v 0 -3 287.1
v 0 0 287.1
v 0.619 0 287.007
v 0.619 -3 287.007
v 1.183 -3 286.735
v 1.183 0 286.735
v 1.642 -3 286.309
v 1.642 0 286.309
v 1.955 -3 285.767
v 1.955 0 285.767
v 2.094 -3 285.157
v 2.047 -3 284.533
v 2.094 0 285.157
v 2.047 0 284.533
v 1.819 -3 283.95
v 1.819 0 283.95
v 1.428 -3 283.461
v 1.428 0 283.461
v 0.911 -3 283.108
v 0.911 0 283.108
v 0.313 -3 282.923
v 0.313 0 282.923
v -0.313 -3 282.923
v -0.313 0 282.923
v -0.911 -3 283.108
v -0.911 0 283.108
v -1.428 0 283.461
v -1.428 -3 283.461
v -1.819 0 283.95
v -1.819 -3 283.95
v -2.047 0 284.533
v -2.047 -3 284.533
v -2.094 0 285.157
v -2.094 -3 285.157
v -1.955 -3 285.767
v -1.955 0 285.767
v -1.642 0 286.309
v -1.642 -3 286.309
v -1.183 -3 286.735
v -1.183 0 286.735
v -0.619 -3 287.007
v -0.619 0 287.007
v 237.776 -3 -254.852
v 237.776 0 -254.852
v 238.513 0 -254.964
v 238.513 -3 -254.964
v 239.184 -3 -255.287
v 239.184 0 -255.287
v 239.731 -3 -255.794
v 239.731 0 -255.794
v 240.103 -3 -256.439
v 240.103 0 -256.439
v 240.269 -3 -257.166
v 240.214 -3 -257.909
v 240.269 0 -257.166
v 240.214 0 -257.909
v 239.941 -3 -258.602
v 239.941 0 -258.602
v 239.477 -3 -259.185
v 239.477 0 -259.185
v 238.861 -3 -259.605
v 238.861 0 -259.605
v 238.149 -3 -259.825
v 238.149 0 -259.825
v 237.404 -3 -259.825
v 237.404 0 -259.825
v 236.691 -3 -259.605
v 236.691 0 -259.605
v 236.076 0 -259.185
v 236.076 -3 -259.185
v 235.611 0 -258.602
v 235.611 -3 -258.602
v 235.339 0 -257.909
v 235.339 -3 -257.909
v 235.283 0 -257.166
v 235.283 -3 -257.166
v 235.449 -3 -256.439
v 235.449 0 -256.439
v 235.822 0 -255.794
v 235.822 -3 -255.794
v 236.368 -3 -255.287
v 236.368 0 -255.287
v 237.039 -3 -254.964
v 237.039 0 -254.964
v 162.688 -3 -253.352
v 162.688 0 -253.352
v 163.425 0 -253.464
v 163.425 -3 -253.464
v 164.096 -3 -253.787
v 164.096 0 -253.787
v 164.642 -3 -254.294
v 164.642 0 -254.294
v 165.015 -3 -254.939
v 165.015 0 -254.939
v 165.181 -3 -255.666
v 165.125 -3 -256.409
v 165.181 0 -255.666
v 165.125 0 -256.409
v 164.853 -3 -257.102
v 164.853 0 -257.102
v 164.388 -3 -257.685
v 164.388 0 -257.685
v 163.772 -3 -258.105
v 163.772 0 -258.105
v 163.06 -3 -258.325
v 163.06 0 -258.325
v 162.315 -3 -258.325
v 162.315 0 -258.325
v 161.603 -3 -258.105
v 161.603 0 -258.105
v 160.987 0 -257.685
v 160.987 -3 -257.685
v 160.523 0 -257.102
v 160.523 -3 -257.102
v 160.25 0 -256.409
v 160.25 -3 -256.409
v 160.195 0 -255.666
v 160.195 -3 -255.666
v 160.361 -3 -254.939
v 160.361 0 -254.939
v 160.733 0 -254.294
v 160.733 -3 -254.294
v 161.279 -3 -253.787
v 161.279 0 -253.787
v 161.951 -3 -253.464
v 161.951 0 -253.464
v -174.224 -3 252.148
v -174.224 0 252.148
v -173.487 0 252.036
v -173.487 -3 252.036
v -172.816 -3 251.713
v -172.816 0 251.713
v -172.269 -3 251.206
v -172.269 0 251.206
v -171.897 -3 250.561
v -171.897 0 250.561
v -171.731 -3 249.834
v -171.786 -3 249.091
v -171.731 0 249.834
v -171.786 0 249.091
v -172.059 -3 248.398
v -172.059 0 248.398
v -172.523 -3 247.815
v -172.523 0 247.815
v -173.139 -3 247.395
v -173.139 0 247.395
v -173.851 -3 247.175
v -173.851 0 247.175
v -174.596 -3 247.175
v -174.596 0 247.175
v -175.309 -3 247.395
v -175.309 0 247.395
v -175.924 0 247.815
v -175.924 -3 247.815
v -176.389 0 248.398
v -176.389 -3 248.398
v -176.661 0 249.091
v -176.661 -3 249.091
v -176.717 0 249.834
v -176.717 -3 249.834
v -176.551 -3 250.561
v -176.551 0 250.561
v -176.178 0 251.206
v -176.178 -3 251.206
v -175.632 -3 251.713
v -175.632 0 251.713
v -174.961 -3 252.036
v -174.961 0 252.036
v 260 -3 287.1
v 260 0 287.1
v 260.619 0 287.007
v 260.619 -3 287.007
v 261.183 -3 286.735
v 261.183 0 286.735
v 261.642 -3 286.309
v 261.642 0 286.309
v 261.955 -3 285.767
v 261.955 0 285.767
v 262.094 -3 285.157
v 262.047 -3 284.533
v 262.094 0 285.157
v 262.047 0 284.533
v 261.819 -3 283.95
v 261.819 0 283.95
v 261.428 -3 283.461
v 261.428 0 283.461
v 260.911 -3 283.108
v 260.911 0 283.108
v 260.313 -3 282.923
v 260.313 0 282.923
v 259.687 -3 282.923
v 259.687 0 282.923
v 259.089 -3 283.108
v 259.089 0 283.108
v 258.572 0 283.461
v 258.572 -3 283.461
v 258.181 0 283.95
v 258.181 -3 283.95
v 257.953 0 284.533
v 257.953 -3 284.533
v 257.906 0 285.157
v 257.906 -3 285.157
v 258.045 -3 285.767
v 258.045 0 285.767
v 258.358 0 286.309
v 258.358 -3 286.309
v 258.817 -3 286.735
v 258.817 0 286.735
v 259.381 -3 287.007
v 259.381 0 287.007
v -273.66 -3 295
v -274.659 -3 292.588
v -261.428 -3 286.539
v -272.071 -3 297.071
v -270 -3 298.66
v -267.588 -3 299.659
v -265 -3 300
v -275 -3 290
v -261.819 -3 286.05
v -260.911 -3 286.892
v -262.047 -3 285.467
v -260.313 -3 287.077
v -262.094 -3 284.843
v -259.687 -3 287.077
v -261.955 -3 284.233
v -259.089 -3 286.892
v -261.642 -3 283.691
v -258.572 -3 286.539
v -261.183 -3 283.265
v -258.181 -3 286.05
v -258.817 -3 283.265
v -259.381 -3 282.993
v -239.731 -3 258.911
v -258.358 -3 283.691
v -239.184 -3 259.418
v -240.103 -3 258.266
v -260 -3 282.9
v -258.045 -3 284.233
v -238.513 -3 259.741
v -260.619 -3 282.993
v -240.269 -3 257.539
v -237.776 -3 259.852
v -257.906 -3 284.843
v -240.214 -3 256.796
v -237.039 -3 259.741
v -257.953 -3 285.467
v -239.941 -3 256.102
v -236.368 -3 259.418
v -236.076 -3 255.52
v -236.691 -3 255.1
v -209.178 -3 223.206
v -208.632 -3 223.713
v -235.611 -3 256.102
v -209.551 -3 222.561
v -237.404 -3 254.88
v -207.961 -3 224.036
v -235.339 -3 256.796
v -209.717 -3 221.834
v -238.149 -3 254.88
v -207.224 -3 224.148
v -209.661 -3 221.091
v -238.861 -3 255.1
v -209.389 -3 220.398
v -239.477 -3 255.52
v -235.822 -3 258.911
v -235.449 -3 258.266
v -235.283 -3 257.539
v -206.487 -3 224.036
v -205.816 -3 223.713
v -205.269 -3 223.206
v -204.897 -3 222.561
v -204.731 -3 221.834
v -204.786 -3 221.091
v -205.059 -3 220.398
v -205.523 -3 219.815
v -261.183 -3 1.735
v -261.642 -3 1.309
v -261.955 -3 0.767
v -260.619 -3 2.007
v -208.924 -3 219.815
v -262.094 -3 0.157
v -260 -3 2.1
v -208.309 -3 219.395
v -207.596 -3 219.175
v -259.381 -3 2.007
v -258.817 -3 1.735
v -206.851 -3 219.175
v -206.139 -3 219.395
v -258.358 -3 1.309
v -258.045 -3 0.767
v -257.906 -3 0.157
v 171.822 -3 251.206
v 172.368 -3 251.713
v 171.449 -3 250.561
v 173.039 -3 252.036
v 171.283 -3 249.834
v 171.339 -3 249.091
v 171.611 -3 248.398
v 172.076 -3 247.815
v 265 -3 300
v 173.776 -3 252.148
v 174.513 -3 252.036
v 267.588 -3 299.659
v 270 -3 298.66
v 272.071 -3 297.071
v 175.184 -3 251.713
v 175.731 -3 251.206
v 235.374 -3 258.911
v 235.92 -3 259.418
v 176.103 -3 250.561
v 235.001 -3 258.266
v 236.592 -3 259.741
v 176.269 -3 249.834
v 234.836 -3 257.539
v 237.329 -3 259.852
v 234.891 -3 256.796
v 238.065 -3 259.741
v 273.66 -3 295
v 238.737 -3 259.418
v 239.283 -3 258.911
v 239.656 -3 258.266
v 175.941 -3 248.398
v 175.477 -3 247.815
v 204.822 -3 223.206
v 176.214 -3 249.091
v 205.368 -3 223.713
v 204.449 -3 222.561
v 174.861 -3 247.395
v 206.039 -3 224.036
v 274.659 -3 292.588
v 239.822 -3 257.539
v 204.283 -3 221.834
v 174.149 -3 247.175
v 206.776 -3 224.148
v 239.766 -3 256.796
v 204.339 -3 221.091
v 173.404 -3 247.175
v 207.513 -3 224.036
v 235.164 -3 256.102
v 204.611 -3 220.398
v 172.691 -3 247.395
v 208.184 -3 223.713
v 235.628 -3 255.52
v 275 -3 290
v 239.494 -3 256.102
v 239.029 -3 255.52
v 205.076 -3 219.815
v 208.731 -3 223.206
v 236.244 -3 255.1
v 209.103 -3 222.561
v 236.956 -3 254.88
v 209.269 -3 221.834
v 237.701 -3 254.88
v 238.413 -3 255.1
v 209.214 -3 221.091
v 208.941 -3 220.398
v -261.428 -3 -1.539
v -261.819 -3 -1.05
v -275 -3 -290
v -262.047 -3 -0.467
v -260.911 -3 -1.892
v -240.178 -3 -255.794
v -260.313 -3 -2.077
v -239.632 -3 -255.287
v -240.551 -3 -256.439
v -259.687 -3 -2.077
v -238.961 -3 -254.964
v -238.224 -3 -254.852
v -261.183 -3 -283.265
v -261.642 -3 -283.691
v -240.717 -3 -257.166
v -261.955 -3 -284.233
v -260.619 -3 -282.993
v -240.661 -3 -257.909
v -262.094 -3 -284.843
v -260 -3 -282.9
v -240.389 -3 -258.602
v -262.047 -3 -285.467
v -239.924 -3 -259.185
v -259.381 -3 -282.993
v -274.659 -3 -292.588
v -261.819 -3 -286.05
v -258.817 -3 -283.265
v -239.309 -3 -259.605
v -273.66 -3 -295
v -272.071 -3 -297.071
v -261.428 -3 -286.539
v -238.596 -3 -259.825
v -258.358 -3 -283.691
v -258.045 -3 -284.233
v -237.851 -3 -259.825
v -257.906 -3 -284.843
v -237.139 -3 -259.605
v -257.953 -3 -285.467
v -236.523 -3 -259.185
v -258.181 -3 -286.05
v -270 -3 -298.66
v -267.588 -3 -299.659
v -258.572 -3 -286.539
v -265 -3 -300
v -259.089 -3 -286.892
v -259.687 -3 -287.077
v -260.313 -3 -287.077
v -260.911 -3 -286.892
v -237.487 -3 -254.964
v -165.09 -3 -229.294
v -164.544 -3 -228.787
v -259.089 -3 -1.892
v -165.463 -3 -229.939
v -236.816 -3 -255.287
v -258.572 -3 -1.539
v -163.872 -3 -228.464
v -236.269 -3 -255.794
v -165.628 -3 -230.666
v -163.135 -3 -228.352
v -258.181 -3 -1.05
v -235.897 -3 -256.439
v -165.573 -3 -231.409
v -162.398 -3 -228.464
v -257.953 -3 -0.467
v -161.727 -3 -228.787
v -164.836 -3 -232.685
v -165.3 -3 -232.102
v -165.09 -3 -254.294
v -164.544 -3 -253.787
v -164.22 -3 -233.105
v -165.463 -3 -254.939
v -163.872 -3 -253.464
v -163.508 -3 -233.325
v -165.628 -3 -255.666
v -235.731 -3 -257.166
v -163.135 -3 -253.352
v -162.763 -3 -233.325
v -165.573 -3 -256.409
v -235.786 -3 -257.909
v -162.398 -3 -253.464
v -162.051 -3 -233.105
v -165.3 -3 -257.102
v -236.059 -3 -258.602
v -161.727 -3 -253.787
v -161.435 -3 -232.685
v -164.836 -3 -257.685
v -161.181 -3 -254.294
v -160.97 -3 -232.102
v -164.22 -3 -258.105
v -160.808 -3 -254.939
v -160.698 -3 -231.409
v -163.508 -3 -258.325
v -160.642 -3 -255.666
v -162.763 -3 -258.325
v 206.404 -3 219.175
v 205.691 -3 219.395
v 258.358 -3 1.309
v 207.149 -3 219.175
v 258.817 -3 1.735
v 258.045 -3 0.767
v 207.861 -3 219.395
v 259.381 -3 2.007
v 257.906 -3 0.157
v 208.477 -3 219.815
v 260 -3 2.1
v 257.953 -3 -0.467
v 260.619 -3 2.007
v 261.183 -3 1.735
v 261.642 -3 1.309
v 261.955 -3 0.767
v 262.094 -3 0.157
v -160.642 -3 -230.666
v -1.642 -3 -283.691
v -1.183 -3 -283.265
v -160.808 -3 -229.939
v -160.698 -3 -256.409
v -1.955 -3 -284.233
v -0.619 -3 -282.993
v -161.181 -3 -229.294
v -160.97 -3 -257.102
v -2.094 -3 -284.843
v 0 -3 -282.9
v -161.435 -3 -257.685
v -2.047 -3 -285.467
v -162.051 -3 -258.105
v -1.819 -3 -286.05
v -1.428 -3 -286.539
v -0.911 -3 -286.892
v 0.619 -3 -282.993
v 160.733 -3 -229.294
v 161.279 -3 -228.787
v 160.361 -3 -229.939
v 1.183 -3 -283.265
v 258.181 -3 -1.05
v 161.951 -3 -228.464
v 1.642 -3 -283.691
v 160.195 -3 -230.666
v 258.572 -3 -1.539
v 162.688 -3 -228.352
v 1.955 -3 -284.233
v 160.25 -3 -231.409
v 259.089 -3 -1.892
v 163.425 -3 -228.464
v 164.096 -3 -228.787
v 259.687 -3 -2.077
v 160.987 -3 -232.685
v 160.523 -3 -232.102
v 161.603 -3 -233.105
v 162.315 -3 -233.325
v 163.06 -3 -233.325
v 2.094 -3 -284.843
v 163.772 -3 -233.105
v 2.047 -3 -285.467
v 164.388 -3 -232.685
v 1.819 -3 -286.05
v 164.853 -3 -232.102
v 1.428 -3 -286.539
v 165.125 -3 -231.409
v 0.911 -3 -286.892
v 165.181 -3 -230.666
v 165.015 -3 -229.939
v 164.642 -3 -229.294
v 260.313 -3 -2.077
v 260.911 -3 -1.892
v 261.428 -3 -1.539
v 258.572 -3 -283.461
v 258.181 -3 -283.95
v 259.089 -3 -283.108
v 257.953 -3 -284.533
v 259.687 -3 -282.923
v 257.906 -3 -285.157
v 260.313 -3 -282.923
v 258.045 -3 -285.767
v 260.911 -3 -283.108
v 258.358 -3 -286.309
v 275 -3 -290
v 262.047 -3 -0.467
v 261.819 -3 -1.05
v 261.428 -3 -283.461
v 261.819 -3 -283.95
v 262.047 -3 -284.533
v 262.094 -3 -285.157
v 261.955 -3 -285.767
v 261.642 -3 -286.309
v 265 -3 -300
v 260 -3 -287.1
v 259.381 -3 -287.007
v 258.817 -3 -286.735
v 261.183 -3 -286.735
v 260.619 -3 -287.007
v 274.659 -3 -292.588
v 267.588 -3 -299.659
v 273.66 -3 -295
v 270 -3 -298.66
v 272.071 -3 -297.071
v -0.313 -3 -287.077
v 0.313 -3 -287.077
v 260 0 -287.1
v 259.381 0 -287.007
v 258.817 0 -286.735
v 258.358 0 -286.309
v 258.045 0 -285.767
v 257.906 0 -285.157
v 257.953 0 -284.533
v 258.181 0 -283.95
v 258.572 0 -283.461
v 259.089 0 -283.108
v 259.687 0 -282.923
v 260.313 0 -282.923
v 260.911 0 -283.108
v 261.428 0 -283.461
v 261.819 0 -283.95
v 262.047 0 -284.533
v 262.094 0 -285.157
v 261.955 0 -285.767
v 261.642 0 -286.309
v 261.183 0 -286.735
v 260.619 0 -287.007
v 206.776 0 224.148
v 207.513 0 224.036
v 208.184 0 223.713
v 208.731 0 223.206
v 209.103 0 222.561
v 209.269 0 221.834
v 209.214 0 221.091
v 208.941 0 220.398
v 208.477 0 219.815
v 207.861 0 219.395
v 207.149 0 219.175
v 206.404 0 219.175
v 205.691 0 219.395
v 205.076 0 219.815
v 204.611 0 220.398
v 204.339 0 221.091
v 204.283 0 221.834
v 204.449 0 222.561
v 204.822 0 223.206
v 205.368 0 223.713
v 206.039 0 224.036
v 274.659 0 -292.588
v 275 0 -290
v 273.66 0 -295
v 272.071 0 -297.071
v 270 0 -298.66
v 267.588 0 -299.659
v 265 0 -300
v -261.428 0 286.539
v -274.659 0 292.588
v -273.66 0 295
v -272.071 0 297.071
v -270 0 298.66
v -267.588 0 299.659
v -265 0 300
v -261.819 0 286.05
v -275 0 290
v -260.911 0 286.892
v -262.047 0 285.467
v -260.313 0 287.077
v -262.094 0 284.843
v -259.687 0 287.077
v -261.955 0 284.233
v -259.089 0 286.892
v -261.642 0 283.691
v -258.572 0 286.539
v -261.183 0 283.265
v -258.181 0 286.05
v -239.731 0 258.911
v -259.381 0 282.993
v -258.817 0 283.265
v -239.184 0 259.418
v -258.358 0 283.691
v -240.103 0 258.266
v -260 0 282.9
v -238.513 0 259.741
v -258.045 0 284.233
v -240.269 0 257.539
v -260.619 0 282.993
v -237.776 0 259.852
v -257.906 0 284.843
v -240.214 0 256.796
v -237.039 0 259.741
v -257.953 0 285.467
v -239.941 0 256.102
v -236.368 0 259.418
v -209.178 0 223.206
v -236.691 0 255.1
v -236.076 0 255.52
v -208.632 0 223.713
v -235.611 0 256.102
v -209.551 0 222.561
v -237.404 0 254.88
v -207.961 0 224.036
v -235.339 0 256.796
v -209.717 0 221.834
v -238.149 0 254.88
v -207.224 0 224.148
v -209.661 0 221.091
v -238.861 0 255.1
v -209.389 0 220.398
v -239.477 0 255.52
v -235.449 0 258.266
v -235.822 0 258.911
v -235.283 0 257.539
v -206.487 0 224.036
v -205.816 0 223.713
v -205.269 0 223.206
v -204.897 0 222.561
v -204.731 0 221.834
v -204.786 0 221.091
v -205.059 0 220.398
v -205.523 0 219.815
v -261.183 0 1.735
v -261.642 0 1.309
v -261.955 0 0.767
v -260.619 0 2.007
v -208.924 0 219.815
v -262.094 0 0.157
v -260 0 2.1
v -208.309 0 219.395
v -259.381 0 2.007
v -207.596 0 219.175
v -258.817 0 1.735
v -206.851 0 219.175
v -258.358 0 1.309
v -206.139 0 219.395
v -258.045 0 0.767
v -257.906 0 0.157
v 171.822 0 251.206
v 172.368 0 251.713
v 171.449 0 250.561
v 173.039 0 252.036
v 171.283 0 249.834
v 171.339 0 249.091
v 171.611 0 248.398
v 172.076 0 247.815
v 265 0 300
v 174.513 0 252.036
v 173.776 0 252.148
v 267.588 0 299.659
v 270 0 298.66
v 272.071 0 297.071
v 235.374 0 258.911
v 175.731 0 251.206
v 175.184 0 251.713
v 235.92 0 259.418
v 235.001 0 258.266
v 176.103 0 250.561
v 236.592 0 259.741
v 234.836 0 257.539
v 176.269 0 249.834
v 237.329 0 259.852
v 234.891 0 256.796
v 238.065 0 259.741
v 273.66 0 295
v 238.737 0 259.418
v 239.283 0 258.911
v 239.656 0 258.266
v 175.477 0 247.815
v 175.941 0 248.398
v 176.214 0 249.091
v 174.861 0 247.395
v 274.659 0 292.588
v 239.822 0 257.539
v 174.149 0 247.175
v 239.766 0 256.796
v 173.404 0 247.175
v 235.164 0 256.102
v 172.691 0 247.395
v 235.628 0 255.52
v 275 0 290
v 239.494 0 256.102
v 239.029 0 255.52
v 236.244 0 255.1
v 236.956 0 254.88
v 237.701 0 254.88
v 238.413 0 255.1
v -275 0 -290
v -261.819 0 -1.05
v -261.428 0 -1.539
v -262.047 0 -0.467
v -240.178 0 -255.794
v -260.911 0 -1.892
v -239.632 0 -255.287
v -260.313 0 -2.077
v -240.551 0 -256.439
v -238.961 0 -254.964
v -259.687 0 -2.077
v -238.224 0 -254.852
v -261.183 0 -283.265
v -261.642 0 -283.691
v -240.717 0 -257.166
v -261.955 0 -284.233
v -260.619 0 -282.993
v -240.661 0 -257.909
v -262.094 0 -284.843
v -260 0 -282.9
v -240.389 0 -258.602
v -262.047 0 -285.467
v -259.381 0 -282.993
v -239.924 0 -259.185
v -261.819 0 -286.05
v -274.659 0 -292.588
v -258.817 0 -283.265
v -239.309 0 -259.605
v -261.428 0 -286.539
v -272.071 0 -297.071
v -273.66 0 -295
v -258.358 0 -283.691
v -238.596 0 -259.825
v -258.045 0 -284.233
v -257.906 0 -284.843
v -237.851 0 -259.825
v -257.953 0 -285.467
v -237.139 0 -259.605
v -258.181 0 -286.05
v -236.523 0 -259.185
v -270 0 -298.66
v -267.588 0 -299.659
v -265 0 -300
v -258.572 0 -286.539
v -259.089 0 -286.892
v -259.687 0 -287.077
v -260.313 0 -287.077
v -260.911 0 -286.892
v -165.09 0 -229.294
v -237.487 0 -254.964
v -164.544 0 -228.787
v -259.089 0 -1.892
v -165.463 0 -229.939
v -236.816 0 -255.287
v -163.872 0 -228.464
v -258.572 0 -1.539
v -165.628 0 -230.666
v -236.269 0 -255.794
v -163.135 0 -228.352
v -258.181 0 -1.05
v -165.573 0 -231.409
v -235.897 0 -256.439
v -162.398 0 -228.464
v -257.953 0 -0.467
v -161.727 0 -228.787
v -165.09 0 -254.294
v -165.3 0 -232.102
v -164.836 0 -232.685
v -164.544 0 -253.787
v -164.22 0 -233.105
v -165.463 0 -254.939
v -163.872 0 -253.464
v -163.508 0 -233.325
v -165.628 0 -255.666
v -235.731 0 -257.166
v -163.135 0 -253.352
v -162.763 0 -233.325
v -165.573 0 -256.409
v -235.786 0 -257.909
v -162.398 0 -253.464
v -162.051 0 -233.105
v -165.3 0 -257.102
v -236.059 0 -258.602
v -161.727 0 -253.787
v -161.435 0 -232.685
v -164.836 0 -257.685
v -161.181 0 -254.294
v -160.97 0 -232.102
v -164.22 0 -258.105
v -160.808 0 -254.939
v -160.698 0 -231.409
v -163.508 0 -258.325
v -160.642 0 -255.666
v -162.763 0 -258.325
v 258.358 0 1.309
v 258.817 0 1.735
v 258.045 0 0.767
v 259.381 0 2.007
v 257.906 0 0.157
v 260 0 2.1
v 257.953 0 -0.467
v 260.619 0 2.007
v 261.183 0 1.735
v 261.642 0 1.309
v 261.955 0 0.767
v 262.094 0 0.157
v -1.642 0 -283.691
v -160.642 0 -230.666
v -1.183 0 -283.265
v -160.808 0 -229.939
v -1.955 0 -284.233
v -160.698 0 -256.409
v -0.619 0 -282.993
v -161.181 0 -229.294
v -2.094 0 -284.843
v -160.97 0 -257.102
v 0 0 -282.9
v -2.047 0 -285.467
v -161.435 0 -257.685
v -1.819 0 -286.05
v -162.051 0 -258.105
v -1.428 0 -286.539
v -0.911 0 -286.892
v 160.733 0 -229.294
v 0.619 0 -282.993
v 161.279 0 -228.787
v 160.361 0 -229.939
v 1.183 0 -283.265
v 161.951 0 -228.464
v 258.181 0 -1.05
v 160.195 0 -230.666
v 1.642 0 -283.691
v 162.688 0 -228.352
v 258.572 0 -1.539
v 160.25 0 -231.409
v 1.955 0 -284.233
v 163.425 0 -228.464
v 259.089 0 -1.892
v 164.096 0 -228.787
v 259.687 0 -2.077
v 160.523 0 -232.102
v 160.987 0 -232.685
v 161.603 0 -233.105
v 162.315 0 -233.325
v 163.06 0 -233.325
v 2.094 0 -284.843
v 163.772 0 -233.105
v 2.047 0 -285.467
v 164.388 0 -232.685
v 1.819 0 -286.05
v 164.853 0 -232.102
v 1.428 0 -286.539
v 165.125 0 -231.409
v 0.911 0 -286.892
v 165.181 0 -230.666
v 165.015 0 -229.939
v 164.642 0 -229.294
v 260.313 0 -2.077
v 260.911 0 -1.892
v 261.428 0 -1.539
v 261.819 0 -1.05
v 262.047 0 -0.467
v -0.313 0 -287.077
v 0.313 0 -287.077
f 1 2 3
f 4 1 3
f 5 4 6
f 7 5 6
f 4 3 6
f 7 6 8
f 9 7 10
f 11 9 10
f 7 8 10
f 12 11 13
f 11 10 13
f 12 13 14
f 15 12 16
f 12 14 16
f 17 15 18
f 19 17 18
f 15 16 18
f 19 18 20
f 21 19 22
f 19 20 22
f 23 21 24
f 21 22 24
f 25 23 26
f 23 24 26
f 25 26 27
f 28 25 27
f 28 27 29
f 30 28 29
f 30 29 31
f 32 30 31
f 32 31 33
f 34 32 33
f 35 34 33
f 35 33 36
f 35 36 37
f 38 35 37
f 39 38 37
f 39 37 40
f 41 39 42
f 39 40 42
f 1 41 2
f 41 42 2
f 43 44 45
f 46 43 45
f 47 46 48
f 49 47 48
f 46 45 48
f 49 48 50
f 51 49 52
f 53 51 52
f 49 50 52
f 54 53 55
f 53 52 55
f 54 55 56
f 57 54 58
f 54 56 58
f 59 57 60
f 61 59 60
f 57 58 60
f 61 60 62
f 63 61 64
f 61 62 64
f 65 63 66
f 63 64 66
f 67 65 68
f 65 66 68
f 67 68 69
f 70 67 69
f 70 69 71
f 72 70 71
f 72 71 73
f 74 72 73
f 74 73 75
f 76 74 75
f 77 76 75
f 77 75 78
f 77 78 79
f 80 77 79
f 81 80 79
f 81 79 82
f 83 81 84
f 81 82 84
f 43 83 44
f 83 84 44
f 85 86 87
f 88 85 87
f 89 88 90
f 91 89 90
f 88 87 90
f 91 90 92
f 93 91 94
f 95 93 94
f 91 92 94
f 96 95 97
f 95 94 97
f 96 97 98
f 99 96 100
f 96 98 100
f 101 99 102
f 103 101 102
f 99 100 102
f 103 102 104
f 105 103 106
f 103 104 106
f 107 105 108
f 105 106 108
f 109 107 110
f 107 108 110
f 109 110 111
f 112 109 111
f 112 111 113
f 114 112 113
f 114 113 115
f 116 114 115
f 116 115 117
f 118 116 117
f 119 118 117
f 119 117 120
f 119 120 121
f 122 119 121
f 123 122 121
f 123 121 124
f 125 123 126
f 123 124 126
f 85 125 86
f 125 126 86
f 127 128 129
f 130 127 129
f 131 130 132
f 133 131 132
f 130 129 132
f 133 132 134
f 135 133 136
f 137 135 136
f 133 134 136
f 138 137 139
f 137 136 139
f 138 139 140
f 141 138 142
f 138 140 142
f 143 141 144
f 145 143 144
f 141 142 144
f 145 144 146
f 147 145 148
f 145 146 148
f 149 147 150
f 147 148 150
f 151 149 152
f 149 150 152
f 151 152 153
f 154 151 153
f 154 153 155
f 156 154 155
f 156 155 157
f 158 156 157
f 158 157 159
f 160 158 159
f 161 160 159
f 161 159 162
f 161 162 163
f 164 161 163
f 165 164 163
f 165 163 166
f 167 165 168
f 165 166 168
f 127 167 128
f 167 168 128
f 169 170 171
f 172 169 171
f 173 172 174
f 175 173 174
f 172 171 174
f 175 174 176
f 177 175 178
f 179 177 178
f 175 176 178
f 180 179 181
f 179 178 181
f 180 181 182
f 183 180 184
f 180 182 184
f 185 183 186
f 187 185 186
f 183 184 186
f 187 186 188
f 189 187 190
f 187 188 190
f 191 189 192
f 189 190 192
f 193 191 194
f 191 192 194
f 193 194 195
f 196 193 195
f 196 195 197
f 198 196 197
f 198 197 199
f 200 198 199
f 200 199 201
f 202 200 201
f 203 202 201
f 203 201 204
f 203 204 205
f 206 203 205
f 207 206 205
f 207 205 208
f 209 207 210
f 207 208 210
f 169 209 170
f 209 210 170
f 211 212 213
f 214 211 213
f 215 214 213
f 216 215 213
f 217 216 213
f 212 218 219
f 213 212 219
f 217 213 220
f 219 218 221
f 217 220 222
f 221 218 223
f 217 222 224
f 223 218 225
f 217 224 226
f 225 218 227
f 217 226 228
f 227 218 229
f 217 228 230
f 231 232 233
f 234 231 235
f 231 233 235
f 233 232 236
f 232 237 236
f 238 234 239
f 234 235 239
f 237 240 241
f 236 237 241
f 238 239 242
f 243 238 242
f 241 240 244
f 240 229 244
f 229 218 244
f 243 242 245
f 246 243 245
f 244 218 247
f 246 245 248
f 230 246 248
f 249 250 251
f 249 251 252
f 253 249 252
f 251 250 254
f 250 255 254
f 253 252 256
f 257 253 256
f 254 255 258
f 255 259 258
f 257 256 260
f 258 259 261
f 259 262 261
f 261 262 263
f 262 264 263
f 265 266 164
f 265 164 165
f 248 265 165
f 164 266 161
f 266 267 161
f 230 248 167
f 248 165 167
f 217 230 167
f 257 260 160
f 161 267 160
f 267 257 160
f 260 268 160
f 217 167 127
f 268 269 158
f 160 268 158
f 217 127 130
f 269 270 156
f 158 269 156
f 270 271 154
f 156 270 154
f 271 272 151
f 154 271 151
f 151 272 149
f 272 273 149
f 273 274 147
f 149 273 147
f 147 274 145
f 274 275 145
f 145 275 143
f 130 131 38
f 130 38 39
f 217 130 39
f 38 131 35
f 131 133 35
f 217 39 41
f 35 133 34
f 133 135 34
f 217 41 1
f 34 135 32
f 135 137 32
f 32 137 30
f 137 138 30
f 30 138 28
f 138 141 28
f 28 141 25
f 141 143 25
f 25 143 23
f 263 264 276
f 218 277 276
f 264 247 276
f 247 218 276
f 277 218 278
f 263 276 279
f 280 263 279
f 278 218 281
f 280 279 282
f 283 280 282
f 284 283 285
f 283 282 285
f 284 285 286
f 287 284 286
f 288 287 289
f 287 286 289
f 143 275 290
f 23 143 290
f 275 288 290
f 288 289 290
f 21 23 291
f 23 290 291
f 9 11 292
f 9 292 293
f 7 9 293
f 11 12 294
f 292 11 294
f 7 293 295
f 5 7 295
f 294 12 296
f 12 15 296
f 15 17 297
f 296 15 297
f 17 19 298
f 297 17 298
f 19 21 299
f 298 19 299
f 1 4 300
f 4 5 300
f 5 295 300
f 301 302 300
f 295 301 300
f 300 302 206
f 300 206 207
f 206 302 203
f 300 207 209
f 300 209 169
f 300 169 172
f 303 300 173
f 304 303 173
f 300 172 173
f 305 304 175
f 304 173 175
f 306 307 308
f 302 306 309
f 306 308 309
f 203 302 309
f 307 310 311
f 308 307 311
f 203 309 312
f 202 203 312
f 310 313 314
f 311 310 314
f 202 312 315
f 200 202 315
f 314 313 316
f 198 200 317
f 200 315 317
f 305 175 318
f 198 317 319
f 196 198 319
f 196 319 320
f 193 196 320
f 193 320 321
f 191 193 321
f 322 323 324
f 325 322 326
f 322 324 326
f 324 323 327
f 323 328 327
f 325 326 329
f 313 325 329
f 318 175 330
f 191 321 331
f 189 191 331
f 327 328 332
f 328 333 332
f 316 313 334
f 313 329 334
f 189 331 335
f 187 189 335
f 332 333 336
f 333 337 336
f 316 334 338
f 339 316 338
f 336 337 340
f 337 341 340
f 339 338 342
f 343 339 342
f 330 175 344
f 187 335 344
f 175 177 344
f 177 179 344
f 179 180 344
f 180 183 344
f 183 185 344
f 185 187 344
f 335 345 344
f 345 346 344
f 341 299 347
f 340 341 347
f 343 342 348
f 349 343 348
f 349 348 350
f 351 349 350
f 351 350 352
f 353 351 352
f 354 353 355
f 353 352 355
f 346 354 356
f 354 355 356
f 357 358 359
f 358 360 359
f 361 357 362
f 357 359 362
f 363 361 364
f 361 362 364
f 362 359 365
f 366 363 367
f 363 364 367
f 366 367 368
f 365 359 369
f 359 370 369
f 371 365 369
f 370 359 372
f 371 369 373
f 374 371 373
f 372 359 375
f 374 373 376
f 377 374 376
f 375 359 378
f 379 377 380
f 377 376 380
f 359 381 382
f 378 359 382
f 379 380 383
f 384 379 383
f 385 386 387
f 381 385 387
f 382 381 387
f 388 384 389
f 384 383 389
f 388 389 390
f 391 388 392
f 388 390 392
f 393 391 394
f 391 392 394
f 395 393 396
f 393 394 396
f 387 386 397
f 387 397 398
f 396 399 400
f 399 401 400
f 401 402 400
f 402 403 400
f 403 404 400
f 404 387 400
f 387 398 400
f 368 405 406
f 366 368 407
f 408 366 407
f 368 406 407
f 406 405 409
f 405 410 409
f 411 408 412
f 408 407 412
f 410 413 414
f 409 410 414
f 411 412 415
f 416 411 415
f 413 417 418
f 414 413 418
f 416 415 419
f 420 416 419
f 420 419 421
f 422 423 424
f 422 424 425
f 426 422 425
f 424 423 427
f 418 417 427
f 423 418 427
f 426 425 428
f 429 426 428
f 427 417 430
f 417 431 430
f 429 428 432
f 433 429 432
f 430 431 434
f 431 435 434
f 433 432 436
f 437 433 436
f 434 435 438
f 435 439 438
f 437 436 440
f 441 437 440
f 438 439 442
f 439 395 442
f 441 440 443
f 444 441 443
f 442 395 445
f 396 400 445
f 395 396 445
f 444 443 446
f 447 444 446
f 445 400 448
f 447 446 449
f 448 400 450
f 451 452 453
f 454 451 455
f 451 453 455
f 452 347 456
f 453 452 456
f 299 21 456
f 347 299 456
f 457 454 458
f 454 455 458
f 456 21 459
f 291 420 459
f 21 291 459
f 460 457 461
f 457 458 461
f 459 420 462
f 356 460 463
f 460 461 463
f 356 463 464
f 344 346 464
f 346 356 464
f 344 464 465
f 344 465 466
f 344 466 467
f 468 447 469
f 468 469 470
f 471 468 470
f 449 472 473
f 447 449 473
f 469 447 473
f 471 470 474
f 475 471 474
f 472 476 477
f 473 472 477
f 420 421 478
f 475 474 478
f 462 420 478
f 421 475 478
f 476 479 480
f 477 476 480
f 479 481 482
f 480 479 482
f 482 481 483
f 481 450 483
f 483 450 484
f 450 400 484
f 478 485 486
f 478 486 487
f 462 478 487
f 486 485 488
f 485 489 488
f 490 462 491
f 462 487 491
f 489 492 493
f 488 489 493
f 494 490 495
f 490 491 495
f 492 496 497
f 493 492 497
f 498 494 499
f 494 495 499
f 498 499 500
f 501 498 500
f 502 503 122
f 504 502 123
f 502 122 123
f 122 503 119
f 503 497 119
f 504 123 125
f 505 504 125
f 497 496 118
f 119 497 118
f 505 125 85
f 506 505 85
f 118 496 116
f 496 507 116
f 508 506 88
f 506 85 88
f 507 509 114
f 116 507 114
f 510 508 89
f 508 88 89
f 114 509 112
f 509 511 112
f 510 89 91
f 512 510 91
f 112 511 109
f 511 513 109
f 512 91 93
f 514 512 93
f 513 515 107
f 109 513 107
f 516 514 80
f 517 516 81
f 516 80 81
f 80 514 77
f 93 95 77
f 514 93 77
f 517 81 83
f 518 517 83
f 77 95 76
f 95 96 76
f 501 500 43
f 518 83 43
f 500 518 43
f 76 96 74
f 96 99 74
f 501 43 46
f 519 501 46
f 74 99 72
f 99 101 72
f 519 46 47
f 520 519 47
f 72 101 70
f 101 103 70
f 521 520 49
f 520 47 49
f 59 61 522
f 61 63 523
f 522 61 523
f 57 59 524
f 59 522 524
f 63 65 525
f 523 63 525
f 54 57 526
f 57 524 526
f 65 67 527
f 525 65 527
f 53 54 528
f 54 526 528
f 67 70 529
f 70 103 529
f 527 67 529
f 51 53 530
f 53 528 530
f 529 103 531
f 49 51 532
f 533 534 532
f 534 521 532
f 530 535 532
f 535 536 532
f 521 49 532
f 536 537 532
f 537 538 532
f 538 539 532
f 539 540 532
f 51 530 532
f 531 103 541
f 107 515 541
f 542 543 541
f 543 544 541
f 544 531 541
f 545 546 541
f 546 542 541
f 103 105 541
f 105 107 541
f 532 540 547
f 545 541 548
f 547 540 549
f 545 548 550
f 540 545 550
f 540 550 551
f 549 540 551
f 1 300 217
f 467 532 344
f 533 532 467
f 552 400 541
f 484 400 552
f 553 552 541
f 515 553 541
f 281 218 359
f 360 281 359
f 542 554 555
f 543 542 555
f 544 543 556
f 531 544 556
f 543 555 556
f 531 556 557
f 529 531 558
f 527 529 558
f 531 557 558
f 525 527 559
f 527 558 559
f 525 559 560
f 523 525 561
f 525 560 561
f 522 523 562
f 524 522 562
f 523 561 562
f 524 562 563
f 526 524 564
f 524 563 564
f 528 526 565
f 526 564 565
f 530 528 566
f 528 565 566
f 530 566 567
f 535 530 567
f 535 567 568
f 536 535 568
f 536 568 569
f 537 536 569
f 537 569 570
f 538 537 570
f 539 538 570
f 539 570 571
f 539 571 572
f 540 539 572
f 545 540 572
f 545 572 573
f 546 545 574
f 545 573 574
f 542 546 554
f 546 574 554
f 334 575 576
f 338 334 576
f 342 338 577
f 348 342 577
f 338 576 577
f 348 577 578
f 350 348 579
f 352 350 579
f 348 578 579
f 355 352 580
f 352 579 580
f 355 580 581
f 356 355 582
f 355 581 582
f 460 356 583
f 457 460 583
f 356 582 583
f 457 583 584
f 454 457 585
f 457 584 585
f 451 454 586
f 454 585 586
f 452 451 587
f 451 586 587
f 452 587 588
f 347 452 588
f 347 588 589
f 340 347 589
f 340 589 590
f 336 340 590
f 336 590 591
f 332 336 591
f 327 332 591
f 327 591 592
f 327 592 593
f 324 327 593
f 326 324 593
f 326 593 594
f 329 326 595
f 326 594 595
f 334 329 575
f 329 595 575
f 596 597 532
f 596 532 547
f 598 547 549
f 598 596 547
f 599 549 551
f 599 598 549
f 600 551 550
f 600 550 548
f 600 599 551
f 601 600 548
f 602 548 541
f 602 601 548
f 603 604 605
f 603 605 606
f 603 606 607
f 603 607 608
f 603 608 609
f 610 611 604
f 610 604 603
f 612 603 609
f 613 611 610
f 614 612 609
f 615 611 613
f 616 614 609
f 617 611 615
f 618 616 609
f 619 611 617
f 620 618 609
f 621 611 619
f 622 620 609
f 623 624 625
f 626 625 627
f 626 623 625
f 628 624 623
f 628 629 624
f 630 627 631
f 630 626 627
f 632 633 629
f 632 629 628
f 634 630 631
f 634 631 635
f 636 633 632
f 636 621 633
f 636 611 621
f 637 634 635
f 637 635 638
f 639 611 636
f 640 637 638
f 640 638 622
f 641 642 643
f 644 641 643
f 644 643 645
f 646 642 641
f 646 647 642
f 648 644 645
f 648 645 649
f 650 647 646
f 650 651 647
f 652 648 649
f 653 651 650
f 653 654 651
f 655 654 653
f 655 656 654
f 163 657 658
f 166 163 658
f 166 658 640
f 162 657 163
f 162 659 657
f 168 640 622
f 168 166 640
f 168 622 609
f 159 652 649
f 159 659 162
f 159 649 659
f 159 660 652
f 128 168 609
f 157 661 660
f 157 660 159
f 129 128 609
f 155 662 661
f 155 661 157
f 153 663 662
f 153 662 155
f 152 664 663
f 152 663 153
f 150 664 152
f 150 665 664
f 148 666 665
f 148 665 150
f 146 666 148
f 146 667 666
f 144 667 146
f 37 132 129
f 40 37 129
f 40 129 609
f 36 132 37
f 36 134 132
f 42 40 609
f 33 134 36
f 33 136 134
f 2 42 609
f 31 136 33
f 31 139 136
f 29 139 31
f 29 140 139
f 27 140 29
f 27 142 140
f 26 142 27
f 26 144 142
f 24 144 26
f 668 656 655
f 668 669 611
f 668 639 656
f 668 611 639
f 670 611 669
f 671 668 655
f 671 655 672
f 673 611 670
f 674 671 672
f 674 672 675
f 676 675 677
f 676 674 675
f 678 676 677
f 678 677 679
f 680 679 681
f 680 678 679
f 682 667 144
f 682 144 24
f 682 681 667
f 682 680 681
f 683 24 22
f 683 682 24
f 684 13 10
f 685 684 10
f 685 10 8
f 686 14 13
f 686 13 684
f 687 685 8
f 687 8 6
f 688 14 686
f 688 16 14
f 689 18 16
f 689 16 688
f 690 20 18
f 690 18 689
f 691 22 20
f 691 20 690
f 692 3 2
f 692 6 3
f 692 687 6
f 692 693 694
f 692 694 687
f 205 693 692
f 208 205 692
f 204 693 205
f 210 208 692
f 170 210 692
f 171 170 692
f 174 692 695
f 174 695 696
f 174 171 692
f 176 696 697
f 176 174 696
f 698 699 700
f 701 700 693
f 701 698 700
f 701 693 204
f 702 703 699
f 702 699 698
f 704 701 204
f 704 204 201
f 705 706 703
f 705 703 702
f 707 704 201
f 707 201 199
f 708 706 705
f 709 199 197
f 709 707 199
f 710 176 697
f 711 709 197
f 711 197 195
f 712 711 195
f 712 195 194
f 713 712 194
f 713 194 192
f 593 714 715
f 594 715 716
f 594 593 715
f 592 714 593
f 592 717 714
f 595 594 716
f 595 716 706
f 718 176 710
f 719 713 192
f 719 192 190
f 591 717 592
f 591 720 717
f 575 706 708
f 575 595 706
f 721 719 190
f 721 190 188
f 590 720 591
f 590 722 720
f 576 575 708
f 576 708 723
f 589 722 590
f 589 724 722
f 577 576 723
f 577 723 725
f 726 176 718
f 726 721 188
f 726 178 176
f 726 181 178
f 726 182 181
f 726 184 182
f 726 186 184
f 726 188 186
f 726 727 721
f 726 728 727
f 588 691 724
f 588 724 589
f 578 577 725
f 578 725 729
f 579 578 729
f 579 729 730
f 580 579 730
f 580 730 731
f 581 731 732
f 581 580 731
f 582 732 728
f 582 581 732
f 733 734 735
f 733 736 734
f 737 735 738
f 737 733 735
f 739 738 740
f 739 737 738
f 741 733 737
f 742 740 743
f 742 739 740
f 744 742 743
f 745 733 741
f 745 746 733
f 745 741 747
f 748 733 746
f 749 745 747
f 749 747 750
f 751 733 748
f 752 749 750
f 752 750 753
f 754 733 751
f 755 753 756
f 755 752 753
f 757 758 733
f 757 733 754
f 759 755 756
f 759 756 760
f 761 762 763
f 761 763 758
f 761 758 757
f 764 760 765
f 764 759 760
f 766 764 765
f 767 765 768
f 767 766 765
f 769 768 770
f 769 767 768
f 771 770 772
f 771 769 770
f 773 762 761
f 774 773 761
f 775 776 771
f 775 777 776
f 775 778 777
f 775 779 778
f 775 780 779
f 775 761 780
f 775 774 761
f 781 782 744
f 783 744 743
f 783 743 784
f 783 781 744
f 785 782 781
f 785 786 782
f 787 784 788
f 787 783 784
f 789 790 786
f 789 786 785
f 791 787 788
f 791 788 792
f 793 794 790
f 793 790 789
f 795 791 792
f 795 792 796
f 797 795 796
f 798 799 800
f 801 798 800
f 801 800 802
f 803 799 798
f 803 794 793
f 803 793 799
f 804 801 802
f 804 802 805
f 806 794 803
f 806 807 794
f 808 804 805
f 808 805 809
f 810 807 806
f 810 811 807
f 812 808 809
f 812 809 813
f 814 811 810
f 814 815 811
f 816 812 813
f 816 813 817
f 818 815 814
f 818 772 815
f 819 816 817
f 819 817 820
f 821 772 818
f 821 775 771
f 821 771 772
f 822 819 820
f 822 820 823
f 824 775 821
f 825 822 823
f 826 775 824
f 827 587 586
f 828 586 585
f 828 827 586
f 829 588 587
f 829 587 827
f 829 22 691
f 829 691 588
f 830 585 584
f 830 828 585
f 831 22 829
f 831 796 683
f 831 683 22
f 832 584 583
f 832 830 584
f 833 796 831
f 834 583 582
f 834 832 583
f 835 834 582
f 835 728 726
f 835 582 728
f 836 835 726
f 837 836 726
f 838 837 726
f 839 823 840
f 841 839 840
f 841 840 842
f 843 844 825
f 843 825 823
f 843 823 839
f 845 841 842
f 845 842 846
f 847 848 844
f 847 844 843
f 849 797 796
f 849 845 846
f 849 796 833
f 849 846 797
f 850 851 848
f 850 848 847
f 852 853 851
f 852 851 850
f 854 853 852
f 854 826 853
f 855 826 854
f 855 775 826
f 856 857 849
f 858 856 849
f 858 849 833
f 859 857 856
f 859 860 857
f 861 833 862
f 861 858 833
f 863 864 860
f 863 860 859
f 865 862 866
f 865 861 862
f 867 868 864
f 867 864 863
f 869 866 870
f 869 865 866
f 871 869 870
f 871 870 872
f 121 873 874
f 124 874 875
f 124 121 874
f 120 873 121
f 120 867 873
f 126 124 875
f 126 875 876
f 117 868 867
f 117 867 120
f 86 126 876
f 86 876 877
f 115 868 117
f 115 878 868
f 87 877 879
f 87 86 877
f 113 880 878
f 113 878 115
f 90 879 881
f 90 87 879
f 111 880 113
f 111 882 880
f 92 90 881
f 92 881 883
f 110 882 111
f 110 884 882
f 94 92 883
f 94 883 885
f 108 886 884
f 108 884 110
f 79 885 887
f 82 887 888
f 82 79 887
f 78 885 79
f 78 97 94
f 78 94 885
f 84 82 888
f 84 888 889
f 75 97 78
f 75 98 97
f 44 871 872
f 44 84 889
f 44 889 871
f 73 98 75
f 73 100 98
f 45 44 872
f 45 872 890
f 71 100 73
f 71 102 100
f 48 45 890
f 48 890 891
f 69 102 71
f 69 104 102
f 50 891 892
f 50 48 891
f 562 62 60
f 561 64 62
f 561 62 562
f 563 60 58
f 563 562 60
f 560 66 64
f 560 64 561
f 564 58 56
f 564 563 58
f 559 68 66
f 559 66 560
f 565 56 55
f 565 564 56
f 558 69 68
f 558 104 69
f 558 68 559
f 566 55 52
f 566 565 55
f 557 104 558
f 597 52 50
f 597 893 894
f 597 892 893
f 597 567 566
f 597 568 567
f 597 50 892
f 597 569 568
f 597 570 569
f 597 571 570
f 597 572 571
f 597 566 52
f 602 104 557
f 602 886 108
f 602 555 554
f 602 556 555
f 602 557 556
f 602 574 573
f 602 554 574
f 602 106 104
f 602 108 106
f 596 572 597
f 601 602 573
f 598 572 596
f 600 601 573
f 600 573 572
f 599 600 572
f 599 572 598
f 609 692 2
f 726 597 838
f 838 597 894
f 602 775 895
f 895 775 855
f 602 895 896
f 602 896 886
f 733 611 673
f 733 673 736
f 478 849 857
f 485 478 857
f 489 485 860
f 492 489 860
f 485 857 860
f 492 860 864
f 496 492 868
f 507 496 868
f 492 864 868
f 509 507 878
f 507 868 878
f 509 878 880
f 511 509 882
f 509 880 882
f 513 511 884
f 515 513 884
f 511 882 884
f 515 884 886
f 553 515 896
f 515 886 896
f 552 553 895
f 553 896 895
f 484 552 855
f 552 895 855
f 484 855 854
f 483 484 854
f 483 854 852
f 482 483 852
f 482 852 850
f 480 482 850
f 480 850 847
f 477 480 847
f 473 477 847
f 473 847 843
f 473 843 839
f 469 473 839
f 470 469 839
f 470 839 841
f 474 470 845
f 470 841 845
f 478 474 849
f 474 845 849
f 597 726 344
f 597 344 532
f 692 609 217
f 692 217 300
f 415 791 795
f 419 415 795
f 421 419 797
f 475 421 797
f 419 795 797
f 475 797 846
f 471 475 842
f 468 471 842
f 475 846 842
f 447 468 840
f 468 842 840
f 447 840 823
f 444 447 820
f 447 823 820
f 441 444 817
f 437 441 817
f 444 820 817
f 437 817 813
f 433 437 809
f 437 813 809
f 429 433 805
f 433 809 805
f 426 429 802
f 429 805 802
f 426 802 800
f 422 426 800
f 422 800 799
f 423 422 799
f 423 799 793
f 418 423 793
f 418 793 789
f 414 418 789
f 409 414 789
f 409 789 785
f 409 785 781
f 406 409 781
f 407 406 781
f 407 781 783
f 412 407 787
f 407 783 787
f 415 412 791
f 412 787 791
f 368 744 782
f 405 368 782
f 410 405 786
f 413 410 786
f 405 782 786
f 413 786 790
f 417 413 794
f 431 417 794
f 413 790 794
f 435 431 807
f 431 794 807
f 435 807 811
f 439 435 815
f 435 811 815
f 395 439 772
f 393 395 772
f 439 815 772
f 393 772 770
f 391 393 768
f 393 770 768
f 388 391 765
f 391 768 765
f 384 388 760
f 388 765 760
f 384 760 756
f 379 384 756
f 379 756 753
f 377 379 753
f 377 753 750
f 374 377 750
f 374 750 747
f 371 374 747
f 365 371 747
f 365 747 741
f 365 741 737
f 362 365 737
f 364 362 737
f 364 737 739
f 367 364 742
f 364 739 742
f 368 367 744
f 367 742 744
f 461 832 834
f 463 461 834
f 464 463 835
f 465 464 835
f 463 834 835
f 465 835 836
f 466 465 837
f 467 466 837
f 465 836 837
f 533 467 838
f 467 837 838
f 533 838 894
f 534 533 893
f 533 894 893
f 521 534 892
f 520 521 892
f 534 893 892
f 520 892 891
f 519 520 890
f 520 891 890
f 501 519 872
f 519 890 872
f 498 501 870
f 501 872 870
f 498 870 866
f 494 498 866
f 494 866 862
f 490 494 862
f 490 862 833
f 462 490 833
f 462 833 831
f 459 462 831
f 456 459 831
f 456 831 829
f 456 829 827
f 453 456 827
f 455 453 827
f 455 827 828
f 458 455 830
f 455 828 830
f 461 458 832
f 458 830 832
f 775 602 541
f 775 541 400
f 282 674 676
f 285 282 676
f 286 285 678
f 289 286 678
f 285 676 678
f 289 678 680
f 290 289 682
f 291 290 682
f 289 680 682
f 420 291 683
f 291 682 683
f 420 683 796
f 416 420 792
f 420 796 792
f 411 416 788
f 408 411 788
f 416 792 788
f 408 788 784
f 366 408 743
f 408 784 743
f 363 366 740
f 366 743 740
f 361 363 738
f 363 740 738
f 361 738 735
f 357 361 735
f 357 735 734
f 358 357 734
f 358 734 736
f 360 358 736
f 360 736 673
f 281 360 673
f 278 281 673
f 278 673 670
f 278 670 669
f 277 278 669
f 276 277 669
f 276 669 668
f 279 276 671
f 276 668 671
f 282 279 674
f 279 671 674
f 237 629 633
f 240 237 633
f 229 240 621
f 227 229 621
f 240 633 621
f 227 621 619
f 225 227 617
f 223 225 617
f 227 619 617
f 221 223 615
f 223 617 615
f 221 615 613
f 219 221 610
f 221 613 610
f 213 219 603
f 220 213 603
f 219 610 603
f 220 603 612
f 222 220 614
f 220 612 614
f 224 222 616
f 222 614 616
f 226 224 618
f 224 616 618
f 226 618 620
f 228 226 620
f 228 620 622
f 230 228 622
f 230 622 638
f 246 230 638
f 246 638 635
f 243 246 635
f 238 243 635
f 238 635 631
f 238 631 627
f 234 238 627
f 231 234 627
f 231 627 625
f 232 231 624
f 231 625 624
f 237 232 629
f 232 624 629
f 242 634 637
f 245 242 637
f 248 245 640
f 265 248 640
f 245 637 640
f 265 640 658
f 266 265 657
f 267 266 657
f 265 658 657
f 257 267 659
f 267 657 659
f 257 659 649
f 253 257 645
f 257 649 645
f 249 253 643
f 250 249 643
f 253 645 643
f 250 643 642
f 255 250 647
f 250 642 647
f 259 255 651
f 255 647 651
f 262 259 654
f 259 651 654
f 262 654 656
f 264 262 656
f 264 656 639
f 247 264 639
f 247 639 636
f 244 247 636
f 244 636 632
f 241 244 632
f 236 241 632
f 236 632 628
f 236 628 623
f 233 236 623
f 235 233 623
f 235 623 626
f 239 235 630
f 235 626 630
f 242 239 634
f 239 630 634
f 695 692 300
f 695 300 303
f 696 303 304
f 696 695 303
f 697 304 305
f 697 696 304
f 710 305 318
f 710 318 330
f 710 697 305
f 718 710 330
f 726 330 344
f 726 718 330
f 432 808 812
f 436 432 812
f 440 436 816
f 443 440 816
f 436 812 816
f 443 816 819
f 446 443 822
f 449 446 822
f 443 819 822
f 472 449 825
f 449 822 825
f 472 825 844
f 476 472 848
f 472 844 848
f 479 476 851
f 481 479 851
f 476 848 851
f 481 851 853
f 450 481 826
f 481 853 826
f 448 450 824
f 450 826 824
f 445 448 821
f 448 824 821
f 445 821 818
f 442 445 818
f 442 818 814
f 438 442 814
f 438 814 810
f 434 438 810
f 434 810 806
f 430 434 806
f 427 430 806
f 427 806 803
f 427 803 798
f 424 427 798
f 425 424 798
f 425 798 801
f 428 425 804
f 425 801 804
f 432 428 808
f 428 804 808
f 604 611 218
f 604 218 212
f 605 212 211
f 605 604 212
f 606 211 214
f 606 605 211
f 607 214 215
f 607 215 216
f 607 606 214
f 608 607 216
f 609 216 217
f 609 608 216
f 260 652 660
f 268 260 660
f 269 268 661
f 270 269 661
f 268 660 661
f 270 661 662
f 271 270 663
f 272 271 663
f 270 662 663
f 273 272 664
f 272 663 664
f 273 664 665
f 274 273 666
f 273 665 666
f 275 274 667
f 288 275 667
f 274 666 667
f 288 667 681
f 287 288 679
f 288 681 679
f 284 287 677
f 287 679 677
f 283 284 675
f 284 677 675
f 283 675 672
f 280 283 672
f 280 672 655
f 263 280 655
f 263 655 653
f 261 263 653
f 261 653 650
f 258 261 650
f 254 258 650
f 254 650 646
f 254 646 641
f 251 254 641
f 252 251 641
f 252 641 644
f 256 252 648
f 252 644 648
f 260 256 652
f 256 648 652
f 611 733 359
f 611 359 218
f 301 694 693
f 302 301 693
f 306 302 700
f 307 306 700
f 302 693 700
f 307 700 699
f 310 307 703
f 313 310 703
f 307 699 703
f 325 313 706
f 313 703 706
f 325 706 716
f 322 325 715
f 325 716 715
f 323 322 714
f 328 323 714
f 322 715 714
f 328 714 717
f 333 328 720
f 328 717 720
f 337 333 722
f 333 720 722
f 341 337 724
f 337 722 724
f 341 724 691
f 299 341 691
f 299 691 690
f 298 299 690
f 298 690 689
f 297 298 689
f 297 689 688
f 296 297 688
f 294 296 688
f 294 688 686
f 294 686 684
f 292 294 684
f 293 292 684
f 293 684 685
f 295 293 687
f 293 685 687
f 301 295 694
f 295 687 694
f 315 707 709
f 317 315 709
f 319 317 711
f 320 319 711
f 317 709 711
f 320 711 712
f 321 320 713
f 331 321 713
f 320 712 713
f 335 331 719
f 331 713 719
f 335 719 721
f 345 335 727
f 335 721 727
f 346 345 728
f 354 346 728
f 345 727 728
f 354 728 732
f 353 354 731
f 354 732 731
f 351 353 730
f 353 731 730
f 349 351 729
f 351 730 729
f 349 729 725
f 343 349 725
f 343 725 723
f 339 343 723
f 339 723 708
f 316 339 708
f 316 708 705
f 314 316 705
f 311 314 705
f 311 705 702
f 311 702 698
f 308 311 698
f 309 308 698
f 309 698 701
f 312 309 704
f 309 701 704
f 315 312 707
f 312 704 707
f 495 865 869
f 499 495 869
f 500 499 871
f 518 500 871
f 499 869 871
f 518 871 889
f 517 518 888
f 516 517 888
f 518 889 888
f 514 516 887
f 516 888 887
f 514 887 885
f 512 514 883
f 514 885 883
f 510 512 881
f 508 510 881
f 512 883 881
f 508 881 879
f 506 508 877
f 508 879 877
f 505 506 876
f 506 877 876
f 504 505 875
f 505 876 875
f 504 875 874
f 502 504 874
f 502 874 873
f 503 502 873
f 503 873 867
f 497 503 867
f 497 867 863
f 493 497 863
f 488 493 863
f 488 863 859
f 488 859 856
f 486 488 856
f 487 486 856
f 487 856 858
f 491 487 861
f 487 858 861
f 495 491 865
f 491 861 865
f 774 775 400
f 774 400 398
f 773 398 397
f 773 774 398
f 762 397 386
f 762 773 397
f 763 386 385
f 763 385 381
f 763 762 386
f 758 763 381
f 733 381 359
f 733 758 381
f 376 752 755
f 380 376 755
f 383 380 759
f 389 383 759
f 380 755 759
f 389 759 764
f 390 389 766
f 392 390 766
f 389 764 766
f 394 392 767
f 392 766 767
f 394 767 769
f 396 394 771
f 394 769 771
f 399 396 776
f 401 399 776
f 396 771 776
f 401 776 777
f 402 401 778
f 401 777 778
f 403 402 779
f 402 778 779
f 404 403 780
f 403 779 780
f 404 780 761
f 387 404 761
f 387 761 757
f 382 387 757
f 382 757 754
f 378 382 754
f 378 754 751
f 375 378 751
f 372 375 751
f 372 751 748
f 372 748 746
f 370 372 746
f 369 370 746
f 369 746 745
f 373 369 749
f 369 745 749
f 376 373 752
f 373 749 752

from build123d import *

# Parameters (mm, degrees)
SKETCH_1_R             = 2.1
SKETCH_1_R_2           = 2.5
SM_BASE_FLANGE_1_DEPTH = 3


# Sheet-metal steps are written as plain solids
with BuildPart() as part:
    # Sketch 1 → 基体-法兰1 (new body)
    with BuildSketch(Plane(origin=(0, 0, 0), x_dir=(1, 0, 0), z_dir=(0, 1, 0))):
        with BuildLine():
            Line((-265, -300), (265, -300))
            ThreePointArc((265, -300), (272.071067812, -297.071067812), (275, -290))
            Line((275, -290), (275, 290))
            ThreePointArc((275, 290), (272.071067812, 297.071067812), (265, 300))
            Line((265, 300), (-265, 300))
            ThreePointArc((-265, 300), (-272.071067812, 297.071067812), (-275, 290))
            Line((-275, 290), (-275, -290))
            ThreePointArc((-275, -290), (-272.071067812, -297.071067812), (-265, -300))
        make_face()
        with Locations(Location((-260, 285, 0), (0, 0, 270))):
            Circle(SKETCH_1_R, mode=Mode.SUBTRACT)
        with Locations(Location((260, 285, 0), (0, 0, 90))):
            Circle(SKETCH_1_R, mode=Mode.SUBTRACT)
        with Locations(Location((260, -285, 0), (0, 0, 270))):
            Circle(SKETCH_1_R, mode=Mode.SUBTRACT)
        with Locations(Location((-260, -285, 0), (0, 0, 90))):
            Circle(SKETCH_1_R, mode=Mode.SUBTRACT)
        with Locations(Location((-260, 0, 0), (0, 0, 270))):
            Circle(SKETCH_1_R, mode=Mode.SUBTRACT)
        with Locations(Location((0, 285, 0), (0, 0, 270))):
            Circle(SKETCH_1_R, mode=Mode.SUBTRACT)
        with Locations(Location((260, 0, 0), (0, 0, 270))):
            Circle(SKETCH_1_R, mode=Mode.SUBTRACT)
        with Locations(Location((0, -285, 0), (0, 0, 270))):
            Circle(SKETCH_1_R, mode=Mode.SUBTRACT)
        with Locations(Location((206.776192938, -221.647543625, 0), (0, 0, 270))):
            Circle(SKETCH_1_R_2, mode=Mode.SUBTRACT)
        with Locations(Location((173.776192938, -249.647543625, 0), (0, 0, 270))):
            Circle(SKETCH_1_R_2, mode=Mode.SUBTRACT)
        with Locations(Location((-174.223807062, -249.647543625, 0), (0, 0, 270))):
            Circle(SKETCH_1_R_2, mode=Mode.SUBTRACT)
        with Locations(Location((-207.223807062, -221.647543625, 0), (0, 0, 270))):
            Circle(SKETCH_1_R_2, mode=Mode.SUBTRACT)
        with Locations(Location((-237.776192938, -257.352456375, 0), (0, 0, 270))):
            Circle(SKETCH_1_R_2, mode=Mode.SUBTRACT)
        with Locations(Location((237.328578815, -257.352456375, 0), (0, 0, 270))):
            Circle(SKETCH_1_R_2, mode=Mode.SUBTRACT)
        with Locations(Location((237.776192938, 257.352456375, 0), (0, 0, 270))):
            Circle(SKETCH_1_R_2, mode=Mode.SUBTRACT)
        with Locations(Location((162.687716862, 230.852456375, 0), (0, 0, 270))):
            Circle(SKETCH_1_R_2, mode=Mode.SUBTRACT)
        with Locations(Location((162.687716862, 255.852456375, 0), (0, 0, 270))):
            Circle(SKETCH_1_R_2, mode=Mode.SUBTRACT)
        with Locations(Location((-163.135330986, 255.852456375, 0), (0, 0, 270))):
            Circle(SKETCH_1_R_2, mode=Mode.SUBTRACT)
        with Locations(Location((-238.223807062, 257.352456375, 0), (0, 0, 270))):
            Circle(SKETCH_1_R_2, mode=Mode.SUBTRACT)
        with Locations(Location((-163.135330986, 230.852456375, 0), (0, 0, 270))):
            Circle(SKETCH_1_R_2, mode=Mode.SUBTRACT)
    extrude(amount=-SM_BASE_FLANGE_1_DEPTH)


solid = part.part
